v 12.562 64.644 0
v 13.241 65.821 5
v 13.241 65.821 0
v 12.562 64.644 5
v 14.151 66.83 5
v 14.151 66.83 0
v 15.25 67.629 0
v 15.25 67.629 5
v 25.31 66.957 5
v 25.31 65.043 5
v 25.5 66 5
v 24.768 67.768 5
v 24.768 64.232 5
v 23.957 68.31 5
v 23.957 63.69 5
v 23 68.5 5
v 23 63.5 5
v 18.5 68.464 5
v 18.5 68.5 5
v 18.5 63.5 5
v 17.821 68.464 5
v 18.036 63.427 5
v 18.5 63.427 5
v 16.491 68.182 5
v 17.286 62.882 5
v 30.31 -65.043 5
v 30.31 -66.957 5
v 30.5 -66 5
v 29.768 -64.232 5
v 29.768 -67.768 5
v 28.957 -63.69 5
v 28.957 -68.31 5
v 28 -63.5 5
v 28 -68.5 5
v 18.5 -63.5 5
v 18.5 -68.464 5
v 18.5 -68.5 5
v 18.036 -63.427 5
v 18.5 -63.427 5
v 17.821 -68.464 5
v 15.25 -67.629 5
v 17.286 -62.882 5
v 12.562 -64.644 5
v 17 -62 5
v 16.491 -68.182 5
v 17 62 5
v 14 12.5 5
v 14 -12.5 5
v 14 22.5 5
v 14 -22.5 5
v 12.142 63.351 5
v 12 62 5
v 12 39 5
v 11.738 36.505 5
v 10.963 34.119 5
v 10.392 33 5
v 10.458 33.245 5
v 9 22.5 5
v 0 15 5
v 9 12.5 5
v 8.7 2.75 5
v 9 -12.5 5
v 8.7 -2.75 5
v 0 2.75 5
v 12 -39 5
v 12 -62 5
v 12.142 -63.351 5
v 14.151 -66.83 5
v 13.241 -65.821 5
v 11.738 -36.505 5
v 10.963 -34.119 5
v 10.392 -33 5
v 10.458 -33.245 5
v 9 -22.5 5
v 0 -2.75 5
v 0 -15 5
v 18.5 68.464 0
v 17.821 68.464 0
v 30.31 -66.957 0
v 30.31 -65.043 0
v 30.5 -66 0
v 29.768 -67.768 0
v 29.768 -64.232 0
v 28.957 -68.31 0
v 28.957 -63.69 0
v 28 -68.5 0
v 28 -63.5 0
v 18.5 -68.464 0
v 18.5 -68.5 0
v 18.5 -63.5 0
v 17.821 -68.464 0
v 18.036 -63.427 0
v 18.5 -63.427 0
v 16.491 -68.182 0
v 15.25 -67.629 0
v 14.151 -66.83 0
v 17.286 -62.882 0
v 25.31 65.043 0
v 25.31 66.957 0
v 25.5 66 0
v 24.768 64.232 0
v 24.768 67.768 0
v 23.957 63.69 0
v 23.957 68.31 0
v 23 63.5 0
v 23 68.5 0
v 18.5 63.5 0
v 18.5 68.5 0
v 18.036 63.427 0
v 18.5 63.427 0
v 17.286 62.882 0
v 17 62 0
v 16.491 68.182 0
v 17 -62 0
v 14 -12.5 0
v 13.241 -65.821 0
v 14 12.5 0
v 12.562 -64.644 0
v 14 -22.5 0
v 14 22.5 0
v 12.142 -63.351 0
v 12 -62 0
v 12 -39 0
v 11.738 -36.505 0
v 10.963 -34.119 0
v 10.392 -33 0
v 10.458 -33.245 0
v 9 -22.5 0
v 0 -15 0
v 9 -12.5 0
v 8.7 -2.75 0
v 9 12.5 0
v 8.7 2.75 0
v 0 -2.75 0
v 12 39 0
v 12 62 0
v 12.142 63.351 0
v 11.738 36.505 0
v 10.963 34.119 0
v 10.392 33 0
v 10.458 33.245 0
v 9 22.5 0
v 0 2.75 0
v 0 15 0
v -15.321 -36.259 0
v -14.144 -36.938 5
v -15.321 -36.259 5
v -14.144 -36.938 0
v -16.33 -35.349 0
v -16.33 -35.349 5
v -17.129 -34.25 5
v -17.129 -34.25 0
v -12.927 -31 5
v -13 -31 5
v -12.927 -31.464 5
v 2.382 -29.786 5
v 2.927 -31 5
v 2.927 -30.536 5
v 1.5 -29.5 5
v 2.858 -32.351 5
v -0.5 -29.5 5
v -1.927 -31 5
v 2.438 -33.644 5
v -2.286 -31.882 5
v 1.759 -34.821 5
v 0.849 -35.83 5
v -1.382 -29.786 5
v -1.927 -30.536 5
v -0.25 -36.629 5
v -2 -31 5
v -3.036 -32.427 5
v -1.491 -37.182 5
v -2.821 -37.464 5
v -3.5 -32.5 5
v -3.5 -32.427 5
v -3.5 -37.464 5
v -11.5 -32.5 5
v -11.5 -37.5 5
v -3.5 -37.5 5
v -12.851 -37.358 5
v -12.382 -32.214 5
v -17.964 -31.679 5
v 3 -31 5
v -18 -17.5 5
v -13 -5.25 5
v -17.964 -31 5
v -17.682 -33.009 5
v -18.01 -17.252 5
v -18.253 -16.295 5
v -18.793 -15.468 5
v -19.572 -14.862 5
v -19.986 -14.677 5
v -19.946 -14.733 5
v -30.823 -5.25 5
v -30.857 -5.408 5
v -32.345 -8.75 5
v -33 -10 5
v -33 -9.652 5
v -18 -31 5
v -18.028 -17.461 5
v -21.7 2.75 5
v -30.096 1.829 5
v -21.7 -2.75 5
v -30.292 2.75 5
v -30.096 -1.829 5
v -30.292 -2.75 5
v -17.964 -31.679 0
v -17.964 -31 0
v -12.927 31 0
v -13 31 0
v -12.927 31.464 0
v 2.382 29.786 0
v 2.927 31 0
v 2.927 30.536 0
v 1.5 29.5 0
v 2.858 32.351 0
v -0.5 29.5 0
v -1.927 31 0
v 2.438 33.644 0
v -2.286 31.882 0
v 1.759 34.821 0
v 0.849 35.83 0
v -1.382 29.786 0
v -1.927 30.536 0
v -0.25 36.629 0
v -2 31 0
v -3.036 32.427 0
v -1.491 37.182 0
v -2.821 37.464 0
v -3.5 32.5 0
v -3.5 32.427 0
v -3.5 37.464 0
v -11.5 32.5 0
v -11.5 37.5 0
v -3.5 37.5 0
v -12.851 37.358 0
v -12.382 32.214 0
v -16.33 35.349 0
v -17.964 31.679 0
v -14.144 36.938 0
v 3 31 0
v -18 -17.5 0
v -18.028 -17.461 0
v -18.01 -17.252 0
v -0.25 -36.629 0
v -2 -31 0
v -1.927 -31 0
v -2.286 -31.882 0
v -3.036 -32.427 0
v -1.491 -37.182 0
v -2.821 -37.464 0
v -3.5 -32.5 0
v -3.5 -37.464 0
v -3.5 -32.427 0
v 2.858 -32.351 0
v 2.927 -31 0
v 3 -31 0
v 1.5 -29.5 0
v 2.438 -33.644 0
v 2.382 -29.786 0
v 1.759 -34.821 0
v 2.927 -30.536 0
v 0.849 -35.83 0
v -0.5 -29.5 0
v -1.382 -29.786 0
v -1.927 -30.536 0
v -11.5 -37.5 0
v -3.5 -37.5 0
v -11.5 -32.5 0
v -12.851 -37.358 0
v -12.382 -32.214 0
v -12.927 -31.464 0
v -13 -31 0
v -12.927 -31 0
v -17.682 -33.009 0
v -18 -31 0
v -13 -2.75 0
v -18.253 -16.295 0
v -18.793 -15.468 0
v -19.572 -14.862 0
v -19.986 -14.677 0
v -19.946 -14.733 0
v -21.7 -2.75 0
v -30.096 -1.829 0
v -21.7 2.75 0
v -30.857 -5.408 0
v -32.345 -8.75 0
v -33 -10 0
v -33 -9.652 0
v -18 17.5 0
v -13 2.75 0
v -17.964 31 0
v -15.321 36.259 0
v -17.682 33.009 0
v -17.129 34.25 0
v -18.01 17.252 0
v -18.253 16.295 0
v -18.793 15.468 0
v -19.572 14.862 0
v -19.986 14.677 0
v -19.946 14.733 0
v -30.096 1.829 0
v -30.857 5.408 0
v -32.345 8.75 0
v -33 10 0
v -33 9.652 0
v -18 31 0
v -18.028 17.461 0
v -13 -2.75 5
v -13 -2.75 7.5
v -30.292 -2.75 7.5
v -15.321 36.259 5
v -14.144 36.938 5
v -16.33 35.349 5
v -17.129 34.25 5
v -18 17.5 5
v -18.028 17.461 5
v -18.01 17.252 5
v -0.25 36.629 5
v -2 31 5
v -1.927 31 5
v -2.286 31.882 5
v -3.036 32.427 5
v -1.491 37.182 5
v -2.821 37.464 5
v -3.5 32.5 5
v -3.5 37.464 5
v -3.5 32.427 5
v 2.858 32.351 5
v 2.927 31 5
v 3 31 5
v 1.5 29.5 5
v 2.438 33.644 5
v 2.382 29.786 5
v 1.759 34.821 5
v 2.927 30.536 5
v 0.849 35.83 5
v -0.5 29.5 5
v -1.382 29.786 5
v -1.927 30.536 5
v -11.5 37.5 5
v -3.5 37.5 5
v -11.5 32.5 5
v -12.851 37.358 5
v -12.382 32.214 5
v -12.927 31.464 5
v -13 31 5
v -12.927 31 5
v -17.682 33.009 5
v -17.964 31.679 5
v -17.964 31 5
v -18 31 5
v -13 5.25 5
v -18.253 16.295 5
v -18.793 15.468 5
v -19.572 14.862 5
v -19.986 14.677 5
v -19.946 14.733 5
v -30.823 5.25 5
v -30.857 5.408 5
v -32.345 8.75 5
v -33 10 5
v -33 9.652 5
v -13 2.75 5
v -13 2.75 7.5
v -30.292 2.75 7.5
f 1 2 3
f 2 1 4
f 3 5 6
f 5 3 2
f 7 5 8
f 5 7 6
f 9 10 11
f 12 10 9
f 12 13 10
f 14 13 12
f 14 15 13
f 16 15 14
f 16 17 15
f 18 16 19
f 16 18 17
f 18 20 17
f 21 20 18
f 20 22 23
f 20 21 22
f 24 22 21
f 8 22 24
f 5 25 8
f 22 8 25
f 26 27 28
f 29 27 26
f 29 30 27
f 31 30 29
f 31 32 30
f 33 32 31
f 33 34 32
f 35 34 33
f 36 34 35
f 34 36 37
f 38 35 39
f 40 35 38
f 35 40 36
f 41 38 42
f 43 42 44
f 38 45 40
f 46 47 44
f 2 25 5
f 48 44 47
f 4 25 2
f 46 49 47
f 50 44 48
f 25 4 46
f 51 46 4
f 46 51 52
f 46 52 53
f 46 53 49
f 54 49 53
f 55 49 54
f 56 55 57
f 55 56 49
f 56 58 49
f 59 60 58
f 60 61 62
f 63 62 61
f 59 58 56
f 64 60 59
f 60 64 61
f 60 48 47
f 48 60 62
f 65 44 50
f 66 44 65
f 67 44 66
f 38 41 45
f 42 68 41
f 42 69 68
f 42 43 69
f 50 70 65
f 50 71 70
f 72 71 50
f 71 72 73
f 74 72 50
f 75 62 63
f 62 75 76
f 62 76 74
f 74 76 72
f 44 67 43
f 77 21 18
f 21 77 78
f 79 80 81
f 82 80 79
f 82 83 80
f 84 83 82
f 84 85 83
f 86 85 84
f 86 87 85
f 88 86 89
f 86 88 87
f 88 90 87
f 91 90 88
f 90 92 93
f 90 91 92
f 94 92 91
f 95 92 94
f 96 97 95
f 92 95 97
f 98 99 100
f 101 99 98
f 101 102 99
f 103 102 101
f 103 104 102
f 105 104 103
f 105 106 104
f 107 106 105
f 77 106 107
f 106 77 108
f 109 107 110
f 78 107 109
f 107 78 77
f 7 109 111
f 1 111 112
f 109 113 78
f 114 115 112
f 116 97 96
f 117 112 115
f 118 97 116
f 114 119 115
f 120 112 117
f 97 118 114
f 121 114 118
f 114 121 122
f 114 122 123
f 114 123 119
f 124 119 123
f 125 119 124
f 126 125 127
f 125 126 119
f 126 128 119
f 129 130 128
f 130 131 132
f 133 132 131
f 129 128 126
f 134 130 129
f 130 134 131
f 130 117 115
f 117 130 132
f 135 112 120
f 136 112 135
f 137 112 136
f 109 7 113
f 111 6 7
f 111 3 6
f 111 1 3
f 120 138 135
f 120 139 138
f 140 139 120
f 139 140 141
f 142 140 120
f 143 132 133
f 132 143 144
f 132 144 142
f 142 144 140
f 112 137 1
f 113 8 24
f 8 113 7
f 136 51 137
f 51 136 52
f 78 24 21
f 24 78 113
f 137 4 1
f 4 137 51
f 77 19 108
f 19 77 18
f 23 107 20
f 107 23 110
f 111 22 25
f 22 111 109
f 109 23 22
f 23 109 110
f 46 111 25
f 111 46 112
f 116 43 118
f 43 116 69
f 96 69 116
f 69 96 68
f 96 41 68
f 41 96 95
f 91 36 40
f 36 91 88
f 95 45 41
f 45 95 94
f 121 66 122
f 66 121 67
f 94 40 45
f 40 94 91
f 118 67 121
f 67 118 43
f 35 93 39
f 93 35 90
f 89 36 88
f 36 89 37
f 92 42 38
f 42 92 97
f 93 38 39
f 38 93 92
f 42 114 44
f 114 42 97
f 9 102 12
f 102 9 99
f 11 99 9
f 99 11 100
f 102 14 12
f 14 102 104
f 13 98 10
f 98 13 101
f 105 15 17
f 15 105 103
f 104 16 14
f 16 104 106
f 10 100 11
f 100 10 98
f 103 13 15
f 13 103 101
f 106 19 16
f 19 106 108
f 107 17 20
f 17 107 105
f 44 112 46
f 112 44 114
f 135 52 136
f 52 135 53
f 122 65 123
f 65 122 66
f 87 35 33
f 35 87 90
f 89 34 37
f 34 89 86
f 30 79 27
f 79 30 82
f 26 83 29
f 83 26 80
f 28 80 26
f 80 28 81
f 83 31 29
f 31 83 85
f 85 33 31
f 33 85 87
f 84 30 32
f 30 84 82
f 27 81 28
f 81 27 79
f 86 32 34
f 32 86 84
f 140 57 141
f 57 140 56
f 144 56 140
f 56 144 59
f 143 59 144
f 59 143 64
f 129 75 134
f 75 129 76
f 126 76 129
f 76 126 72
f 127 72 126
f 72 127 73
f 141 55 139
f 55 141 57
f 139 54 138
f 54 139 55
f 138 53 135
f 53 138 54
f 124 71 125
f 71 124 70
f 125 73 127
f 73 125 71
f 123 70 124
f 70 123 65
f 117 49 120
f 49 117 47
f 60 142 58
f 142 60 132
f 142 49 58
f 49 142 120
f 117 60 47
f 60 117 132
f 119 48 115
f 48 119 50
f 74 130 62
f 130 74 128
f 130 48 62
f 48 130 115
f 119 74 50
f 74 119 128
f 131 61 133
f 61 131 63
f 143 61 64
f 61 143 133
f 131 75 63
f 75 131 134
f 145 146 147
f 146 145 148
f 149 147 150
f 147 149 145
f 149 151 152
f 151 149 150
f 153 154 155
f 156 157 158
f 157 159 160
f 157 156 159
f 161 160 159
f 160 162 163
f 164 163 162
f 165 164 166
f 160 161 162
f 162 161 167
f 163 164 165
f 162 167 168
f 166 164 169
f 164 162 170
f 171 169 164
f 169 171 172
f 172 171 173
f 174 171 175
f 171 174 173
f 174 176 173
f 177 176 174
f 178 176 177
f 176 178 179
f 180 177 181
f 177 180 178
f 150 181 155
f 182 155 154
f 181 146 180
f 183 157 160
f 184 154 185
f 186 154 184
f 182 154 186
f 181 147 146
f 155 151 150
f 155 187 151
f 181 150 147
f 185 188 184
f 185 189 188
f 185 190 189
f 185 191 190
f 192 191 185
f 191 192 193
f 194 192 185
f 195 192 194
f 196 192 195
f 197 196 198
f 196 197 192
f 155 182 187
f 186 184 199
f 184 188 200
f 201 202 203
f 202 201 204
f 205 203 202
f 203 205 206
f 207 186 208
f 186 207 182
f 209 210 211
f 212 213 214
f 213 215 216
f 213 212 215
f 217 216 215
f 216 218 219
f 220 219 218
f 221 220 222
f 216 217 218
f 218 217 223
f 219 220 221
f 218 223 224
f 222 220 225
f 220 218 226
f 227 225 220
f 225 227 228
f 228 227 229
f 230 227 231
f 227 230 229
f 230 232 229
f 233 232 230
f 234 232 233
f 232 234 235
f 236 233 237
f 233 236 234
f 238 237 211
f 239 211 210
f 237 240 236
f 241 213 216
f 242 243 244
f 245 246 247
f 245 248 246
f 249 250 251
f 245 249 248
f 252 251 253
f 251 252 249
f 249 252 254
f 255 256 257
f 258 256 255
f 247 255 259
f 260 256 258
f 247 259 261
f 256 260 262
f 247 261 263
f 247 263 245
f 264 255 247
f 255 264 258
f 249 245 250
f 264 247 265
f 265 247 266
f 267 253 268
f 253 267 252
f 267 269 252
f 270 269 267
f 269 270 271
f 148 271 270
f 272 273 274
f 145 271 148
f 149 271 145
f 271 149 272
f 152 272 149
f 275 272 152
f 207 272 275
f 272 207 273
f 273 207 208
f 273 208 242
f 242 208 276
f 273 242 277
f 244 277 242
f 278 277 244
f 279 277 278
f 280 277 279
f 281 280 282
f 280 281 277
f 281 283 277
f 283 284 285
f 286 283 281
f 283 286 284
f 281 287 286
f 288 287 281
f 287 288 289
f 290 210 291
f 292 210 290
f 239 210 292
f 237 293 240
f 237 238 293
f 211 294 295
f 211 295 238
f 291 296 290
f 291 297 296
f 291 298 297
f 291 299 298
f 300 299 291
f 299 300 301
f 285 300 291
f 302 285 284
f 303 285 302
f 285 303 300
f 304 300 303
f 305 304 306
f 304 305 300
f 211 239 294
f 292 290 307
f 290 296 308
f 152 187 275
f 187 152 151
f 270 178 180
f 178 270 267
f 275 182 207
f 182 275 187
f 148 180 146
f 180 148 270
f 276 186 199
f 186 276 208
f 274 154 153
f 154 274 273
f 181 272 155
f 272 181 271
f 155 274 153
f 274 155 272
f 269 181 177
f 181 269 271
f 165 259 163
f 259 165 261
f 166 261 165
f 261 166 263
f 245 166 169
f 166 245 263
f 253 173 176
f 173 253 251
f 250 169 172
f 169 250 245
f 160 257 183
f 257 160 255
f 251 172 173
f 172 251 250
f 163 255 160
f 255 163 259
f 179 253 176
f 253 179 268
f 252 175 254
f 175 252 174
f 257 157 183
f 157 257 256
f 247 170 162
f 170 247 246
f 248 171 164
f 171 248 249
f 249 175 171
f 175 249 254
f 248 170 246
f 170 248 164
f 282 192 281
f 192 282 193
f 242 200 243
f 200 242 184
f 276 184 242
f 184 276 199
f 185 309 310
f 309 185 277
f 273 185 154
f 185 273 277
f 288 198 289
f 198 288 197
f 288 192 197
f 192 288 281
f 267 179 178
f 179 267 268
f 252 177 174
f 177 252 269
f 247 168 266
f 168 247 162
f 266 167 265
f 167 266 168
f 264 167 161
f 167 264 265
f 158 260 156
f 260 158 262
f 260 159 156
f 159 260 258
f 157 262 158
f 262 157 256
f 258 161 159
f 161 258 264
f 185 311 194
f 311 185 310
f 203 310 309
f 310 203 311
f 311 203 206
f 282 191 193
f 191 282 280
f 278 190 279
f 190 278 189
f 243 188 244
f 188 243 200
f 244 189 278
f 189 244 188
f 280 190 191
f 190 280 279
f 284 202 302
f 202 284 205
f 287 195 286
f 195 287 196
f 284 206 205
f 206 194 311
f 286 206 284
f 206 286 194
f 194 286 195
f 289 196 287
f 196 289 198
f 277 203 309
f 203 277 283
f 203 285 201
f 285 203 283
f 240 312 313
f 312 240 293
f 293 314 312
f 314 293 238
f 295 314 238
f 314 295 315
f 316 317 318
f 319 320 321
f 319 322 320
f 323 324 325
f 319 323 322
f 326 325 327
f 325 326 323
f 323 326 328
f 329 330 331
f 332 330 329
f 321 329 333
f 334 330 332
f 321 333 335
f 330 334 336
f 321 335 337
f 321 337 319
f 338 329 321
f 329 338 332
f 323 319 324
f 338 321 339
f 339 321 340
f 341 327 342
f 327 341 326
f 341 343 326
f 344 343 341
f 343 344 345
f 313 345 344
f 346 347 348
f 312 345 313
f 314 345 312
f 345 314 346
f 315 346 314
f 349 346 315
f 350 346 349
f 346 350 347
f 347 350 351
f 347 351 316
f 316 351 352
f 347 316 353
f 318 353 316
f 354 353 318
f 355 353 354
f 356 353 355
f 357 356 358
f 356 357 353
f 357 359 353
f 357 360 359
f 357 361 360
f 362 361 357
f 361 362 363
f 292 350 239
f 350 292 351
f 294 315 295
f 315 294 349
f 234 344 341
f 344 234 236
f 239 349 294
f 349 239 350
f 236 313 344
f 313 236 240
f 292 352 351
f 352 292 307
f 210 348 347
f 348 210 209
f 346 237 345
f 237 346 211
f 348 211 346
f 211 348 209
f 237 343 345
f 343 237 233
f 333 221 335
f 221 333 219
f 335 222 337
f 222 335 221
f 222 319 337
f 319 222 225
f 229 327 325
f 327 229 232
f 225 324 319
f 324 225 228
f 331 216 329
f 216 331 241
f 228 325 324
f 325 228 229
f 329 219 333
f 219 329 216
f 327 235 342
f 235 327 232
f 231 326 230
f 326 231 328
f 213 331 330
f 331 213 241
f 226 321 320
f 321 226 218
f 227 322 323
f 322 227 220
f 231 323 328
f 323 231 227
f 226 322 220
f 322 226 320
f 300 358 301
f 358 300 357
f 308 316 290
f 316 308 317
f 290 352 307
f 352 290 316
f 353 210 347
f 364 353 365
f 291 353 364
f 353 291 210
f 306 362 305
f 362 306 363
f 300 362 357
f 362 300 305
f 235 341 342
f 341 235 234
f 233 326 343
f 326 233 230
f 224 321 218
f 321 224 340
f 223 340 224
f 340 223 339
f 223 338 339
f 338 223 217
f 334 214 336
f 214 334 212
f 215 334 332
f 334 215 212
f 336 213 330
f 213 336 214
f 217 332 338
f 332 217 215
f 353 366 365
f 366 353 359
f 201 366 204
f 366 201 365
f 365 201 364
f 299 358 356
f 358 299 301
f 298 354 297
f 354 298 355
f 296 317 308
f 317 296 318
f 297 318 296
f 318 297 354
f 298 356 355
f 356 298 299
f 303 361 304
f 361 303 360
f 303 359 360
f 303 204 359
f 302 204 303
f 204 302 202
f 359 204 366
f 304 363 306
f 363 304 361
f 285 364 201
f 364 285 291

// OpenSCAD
// Depending on your printer, you should add an extra 1 to 2 mm.
Phone_Length=127;
// Depending on your printer, you should add an extra 1 to 2 mm.
Phone_Width=65;
// Depending on your printer, you should add an extra 1 to 2 mm.
Phone_Thickness = 11;

// Diameter of the bar where the holder is to be mounted.
Handle_Bar_Diameter = 35;
// Distance from the handle bar to the back of the phone. A smaller number will give a lower profile.
Holder_Height = 17; // [11:17]

/* [Hidden] */
$fs = 1;

module copy_mirror(vec=[0,1,0]) {
 union() {
  children();
  mirror(vec) children();
 }
};

module rounded_corner(vec=[0,0,0],rot=0) {
 translate(vec) rotate([0,0,rot]) difference(){
  intersection(){
   cylinder(r=6.5,h=5);
   translate([-6.5,0,0]) cube([6.5,6.5,5]);
  };
  cylinder(r=1.5,h=5);
 };
};

// Vertical Piece
//translate([2.5,0,0]) rotate([0,-90,0]) difference(){
difference(){
 union(){
  translate([23,Phone_Length/2+2.5,0]) cylinder(r=2.5,h=5);
  translate([18.5,Phone_Length/2,0]) cube([4.5,5,5]);
  copy_mirror([0,1,0]) rounded_corner([18.5,Phone_Length/2-1.5,0]);
  translate([12,-Phone_Length/2+1.5,0]) cube([5,Phone_Length-3,5]);
  translate([18.5,-Phone_Length/2-5,0]) cube([Phone_Thickness-1.5,5,5]);
  translate([17+Phone_Thickness,-Phone_Length/2-2.5,0]) cylinder(r=2.5,h=5);
  linear_extrude(height=5) polygon([[12,-39],[12,39],[10.3923,33],[0,15],[0,-15],[10.3923,-33]]);
 };
 copy_mirror([0,1,0]) translate([0,39,0]) cylinder(r=12,h=5);
 copy_mirror([0,1,0]) translate([9,12.5,0]) cube([5,10,5]);
 translate([17-Holder_Height,-5.5/2,0]) cube([Holder_Height/2+0.2,5.5,5]);
 translate([-Holder_Height,-30,0]) cube([17,60,5]);
};

// Horizontal Piece
//translate([0,2.5,0]) rotate([90,0,0]) copy_mirror([1,0,0]) difference(){
translate([-30,0,0]) rotate([0,0,-90]) copy_mirror([1,0,0]) difference(){
 union(){
  linear_extrude(height=5) polygon([[0,-3],[10,-3],[14.6768,10.0145],[17.5,12],[Phone_Width/2-1.5,12],[Phone_Width/2-1.5,17],[0,17]]);
  rounded_corner([Phone_Width/2-1.5,18.5,0],180);
  translate([Phone_Width/2,18.5,0]) cube([5,Phone_Thickness-3,5]);
  rounded_corner([Phone_Width/2-1.5,17+Phone_Thickness-1.5,0],-90);
  translate([Phone_Width/2-1.5,17+Phone_Thickness+1.5,0]) cylinder(r=1.5,h=5);
  translate([Phone_Width/2-1.5,17+Phone_Thickness+5-1.5,0]) cylinder(r=1.5,h=5);
  translate([Phone_Width/2-3,17+Phone_Thickness+1.5,0]) cube([1.5,2,5]);
  translate([5.5/2,17,5/2]) rotate([90,0,0]) linear_extrude(height=20) polygon([[0,0],[5,0],[0,5]]);
 };
 translate([17.5,9,0]) cylinder(r=3,h=5);
 translate([0,-Handle_Bar_Diameter/2-Holder_Height+17,0]) cylinder(r=Handle_Bar_Diameter/2,h=10);
 translate([-5.5/2,17-(Holder_Height/2+0.2),0]) cube([5.5,Holder_Height/2+0.2,5]);
};
